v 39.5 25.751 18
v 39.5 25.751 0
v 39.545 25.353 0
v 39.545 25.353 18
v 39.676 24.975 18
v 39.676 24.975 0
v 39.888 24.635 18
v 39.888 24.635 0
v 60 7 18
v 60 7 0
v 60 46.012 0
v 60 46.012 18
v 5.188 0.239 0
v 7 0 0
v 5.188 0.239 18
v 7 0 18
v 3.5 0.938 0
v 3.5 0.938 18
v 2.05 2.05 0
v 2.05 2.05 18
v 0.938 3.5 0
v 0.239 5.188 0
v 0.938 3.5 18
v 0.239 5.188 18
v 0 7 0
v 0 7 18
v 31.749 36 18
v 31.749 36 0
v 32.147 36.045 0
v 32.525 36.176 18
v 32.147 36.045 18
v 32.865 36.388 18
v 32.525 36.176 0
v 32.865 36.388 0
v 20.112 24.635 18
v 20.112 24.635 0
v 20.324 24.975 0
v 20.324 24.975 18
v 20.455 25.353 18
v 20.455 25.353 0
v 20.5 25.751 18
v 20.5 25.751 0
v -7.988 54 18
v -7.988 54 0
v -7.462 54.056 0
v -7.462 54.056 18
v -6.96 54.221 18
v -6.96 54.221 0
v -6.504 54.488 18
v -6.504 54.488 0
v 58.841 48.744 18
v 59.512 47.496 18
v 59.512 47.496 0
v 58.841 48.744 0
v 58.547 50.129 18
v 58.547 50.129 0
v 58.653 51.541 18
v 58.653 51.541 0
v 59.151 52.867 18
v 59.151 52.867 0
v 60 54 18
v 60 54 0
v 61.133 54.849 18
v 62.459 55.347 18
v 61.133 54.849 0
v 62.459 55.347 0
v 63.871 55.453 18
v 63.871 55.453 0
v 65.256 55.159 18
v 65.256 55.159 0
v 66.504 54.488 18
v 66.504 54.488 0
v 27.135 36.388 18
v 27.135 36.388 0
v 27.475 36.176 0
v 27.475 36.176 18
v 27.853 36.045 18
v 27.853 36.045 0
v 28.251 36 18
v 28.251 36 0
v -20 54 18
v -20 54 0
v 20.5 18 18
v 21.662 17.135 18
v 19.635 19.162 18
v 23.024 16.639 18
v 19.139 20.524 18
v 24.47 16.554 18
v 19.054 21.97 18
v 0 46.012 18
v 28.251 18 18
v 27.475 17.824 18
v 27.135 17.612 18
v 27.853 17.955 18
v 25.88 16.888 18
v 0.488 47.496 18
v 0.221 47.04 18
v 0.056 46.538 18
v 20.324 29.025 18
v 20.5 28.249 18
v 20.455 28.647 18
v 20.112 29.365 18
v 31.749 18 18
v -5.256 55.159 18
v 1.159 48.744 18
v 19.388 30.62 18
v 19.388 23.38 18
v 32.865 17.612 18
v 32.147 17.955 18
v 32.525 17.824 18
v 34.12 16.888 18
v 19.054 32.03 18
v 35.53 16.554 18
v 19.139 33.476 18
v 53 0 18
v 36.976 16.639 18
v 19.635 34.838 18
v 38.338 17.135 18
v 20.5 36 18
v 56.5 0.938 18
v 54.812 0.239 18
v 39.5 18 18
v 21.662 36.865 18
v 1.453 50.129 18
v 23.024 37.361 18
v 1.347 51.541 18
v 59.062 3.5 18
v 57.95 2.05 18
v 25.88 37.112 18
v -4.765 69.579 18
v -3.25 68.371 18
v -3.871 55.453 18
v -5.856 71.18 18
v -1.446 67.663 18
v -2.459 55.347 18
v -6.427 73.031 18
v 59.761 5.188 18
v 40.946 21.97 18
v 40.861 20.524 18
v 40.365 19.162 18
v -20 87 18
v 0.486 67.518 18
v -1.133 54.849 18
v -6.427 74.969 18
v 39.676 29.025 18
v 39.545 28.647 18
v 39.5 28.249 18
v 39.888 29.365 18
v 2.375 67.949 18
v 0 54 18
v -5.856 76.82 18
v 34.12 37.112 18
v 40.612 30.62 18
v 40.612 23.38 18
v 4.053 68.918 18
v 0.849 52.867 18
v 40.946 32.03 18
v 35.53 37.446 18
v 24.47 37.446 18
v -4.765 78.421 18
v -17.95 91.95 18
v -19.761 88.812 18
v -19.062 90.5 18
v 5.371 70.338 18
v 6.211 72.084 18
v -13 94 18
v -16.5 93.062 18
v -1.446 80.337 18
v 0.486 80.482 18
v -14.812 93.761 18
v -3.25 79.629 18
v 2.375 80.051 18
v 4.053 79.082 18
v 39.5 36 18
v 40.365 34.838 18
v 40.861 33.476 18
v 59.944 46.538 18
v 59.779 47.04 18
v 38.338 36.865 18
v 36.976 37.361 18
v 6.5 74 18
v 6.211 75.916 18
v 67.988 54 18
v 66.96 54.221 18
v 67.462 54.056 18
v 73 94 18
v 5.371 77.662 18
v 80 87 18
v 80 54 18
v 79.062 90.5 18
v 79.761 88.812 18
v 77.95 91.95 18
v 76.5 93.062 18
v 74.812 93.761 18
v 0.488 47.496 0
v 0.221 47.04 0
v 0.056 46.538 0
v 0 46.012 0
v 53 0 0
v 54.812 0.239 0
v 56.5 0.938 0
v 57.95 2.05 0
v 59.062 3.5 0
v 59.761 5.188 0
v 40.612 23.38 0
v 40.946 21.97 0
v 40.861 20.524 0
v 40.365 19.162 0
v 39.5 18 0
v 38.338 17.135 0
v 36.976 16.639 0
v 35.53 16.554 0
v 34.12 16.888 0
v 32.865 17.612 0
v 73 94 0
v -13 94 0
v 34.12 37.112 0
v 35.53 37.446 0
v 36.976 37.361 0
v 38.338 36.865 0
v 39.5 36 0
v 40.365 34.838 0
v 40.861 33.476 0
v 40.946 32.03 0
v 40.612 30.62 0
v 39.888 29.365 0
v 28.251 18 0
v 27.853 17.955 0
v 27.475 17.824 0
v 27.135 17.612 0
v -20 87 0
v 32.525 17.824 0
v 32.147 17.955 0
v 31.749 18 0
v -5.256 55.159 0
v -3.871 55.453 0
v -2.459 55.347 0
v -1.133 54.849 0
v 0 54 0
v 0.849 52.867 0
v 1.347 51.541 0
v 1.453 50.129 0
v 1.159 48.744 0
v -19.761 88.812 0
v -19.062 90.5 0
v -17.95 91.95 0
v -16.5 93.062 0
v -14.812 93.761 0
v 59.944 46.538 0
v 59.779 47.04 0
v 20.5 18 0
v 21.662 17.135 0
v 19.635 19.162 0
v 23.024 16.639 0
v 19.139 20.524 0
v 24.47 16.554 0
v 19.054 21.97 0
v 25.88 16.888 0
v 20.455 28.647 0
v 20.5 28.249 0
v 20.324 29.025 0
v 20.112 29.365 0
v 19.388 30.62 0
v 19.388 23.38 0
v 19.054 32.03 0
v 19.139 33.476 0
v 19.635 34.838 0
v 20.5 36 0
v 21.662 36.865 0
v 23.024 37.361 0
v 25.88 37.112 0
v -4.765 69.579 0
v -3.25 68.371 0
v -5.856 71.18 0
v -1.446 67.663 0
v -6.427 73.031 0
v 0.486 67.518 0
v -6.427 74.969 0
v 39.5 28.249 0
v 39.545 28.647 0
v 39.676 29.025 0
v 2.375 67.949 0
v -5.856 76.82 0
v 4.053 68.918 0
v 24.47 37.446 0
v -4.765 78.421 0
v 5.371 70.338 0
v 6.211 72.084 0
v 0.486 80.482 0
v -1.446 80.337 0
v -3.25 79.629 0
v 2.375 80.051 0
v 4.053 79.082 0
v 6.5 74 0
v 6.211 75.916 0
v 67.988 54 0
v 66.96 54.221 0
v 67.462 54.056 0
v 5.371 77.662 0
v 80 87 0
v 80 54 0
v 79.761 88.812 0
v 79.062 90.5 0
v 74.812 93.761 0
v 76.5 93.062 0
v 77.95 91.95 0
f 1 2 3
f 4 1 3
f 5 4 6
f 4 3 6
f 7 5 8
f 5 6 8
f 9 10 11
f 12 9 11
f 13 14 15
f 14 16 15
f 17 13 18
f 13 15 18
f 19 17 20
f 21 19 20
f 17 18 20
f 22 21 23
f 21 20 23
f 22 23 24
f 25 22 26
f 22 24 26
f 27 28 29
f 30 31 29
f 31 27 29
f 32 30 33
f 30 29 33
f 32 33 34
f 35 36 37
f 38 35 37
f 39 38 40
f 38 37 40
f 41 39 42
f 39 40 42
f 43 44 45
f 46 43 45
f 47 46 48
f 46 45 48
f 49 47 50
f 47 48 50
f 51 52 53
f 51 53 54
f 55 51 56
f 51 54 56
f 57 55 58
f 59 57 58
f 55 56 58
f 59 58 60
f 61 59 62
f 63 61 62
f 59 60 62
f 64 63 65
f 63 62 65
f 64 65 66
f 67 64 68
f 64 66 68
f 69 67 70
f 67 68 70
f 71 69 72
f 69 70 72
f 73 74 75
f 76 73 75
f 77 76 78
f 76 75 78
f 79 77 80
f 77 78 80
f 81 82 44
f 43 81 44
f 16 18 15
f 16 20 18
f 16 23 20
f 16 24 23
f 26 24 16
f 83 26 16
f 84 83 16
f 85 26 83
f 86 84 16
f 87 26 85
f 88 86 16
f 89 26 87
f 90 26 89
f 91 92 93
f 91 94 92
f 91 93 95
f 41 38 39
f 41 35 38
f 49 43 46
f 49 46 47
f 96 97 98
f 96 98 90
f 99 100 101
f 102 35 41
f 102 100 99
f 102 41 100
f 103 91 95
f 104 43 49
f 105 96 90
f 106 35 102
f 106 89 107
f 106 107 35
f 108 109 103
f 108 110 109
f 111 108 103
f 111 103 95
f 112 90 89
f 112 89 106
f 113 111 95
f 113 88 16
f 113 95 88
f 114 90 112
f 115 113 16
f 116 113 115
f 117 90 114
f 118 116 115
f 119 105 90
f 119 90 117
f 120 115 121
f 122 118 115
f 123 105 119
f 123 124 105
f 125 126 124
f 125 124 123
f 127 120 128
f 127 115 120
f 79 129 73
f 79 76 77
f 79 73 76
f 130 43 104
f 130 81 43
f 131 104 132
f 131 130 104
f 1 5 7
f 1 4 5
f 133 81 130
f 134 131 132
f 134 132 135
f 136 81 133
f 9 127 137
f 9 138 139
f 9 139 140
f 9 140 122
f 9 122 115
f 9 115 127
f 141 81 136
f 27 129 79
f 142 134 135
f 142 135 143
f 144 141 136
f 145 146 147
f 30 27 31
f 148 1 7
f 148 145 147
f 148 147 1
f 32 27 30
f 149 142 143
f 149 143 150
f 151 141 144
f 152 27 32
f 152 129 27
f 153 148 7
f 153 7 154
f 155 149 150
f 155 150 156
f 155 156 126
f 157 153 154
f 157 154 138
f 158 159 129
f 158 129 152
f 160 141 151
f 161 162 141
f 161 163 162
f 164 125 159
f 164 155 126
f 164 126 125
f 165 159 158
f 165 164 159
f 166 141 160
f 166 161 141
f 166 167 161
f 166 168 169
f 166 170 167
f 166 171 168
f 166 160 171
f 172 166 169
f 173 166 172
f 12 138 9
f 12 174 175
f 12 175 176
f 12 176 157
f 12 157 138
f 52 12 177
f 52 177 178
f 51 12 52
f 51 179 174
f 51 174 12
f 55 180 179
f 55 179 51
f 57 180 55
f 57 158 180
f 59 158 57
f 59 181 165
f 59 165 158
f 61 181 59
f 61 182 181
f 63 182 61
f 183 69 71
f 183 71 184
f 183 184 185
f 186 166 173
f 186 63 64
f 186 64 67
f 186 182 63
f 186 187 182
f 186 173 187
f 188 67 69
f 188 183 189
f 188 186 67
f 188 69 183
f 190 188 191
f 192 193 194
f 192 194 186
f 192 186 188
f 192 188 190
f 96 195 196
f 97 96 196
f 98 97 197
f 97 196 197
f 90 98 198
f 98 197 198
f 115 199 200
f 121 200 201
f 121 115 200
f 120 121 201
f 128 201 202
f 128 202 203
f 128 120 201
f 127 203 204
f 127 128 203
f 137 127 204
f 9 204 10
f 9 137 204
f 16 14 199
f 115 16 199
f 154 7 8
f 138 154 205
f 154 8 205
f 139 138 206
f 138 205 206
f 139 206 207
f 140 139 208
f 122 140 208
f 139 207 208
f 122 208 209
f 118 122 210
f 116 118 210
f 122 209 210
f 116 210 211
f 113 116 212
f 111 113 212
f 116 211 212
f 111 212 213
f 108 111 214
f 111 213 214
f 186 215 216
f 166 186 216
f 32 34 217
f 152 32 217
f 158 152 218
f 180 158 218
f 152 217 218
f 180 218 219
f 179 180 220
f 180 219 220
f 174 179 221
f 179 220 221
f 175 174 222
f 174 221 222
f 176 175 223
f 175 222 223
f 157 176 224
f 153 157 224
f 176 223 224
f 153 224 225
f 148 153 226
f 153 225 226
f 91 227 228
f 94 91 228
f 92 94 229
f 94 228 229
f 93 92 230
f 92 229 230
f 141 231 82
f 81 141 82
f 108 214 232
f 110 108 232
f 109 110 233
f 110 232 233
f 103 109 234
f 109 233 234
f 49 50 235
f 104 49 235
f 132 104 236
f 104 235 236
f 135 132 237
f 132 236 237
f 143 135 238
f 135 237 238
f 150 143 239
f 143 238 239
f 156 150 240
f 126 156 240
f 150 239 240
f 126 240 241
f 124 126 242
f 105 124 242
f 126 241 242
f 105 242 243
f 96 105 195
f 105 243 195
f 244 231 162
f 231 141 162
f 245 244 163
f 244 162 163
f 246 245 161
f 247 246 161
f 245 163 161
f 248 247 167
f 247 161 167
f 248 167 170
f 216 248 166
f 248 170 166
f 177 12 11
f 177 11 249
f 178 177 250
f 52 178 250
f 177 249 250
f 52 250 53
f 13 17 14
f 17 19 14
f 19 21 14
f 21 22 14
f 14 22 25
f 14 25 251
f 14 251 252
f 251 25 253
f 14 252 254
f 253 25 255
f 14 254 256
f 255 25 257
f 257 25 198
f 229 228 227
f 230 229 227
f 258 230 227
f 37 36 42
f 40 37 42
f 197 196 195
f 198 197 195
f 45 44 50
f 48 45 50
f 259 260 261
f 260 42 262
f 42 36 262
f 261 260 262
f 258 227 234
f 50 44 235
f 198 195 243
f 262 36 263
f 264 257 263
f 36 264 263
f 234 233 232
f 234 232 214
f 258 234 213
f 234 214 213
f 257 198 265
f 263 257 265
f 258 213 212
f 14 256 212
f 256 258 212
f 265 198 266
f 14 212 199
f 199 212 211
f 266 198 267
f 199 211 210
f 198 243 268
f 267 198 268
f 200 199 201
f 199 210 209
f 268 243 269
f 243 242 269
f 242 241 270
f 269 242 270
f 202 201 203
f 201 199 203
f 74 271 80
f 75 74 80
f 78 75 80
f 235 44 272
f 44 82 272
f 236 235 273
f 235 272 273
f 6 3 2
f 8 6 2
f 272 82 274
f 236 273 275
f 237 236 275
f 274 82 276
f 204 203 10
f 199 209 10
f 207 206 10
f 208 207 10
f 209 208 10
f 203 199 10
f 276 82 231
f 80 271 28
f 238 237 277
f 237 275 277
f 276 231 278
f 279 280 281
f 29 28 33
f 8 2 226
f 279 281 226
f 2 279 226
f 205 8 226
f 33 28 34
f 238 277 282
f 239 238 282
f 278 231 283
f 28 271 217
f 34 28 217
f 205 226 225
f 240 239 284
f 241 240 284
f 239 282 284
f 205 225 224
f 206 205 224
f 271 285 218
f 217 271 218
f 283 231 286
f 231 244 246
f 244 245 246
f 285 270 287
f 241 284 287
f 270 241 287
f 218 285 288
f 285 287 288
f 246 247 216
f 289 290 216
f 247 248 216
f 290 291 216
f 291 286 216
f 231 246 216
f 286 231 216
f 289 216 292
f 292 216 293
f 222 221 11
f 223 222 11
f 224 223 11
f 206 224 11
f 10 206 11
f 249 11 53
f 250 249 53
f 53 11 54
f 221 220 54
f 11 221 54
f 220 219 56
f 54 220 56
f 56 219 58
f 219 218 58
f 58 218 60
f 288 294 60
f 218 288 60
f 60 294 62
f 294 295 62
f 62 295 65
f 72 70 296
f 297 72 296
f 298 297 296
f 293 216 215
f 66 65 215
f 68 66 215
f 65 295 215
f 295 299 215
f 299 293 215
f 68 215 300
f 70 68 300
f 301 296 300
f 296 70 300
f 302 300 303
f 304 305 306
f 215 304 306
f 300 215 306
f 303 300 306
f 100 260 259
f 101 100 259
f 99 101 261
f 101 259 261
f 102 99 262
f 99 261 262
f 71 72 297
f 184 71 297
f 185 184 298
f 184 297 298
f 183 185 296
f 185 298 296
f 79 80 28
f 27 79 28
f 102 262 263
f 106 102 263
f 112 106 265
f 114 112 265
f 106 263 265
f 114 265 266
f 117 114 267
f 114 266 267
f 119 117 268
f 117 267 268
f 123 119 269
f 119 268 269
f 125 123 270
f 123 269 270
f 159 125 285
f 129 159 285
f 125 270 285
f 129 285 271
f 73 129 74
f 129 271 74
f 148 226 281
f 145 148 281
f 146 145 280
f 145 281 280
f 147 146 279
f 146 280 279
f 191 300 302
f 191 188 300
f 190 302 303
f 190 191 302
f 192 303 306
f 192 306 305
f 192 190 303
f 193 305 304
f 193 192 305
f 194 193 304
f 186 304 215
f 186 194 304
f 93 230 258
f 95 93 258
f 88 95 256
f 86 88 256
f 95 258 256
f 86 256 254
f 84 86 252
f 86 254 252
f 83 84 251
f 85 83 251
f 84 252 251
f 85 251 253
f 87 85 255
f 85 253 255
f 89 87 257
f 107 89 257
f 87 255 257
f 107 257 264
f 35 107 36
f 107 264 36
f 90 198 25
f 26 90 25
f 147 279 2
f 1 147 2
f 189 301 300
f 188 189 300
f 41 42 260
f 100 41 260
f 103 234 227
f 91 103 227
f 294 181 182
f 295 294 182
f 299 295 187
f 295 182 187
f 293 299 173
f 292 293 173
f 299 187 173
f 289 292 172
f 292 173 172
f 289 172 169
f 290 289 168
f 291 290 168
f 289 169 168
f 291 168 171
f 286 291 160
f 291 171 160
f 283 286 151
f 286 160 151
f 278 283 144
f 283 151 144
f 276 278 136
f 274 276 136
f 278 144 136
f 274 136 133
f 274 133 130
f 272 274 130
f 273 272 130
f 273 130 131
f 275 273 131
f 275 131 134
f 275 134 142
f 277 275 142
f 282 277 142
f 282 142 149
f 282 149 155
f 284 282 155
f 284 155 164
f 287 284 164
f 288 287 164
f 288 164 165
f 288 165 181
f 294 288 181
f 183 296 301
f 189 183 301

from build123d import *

# Parameters (mm, degrees)
BOSS_EXTRU_2_DEPTH      = 18
ENL_V_MAT_EXTRU_1_DEPTH = 19
CONG_1_R                = 7
ESQUISSE3_R             = 6.5
ENL_V_MAT_EXTRU_2_DEPTH = 19


with BuildPart() as part:
    # Esquisse2 → Boss.-Extru.2 (new body)
    with BuildSketch(Plane.XY):
        with BuildLine():
            Line((0, 0), (60, 0))
            Line((60, 0), (60, 46.012238509))
            ThreePointArc((60, 46.012238509), (59.874827529, 46.793387794), (59.511844635, 47.496314371))
            ThreePointArc((59.511844635, 47.496314371), (60, 54), (66.503685629, 54.488155365))
            ThreePointArc((66.503685629, 54.488155365), (67.206612206, 54.125172471), (67.987761491, 54))
            Line((67.987761491, 54), (80, 54))
            Line((80, 54), (80, 94))
            Line((80, 94), (-20, 94))
            Line((-20, 94), (-20, 54))
            Line((-20, 54), (-7.987761491, 54))
            ThreePointArc((-7.987761491, 54), (-7.206612206, 54.125172471), (-6.503685629, 54.488155365))
            ThreePointArc((-6.503685629, 54.488155365), (0, 54), (0.488155365, 47.496314371))
            ThreePointArc((0.488155365, 47.496314371), (0.125172471, 46.793387794), (0, 46.012238509))
            Line((0, 46.012238509), (0, 0))
        make_face()
    extrude(amount=BOSS_EXTRU_2_DEPTH)

    # Esquisse1 → Enlèv. mat.-Extru.1 (cut, through all)
    with BuildSketch(Plane.XY):
        with BuildLine():
            Line((39.5, 28.248771852), (39.5, 25.751228148))
            ThreePointArc((39.5, 25.751228148), (39.599672829, 25.160561143), (39.88765279, 24.635309084))
            ThreePointArc((39.88765279, 24.635309084), (39.5, 18), (32.864690916, 17.61234721))
            ThreePointArc((32.864690916, 17.61234721), (32.339438857, 17.900327171), (31.748771852, 18))
            Line((31.748771852, 18), (28.251228148, 18))
            ThreePointArc((28.251228148, 18), (27.660561143, 17.900327171), (27.135309084, 17.61234721))
            ThreePointArc((27.135309084, 17.61234721), (20.5, 18), (20.11234721, 24.635309084))
            ThreePointArc((20.11234721, 24.635309084), (20.400327171, 25.160561143), (20.5, 25.751228148))
            Line((20.5, 25.751228148), (20.5, 28.248771852))
            ThreePointArc((20.5, 28.248771852), (20.400327171, 28.839438857), (20.11234721, 29.364690916))
            ThreePointArc((20.11234721, 29.364690916), (20.5, 36), (27.135309084, 36.38765279))
            ThreePointArc((27.135309084, 36.38765279), (27.660561143, 36.099672829), (28.251228148, 36))
            Line((28.251228148, 36), (31.748771852, 36))
            ThreePointArc((31.748771852, 36), (32.339438857, 36.099672829), (32.864690916, 36.38765279))
            ThreePointArc((32.864690916, 36.38765279), (39.5, 36), (39.88765279, 29.364690916))
            ThreePointArc((39.88765279, 29.364690916), (39.599672829, 28.839438857), (39.5, 28.248771852))
        make_face()
    extrude(amount=ENL_V_MAT_EXTRU_1_DEPTH, mode=Mode.SUBTRACT)

    # Congé1
    cong_1_edges = [part.edges().sort_by_distance(p)[0] for p in [
        (-20, 94, 9),
        (80, 94, 9),
        (60, 0, 9),
        (0, 0, 9),
    ]]
    fillet(cong_1_edges, radius=CONG_1_R)

    # Esquisse3 → Enlèv. mat.-Extru.2 (cut, through all)
    with BuildSketch(Plane.XY.offset(18)):
        with Locations((0, 74)):
            Circle(ESQUISSE3_R)
    extrude(amount=-ENL_V_MAT_EXTRU_2_DEPTH, mode=Mode.SUBTRACT)


solid = part.part
